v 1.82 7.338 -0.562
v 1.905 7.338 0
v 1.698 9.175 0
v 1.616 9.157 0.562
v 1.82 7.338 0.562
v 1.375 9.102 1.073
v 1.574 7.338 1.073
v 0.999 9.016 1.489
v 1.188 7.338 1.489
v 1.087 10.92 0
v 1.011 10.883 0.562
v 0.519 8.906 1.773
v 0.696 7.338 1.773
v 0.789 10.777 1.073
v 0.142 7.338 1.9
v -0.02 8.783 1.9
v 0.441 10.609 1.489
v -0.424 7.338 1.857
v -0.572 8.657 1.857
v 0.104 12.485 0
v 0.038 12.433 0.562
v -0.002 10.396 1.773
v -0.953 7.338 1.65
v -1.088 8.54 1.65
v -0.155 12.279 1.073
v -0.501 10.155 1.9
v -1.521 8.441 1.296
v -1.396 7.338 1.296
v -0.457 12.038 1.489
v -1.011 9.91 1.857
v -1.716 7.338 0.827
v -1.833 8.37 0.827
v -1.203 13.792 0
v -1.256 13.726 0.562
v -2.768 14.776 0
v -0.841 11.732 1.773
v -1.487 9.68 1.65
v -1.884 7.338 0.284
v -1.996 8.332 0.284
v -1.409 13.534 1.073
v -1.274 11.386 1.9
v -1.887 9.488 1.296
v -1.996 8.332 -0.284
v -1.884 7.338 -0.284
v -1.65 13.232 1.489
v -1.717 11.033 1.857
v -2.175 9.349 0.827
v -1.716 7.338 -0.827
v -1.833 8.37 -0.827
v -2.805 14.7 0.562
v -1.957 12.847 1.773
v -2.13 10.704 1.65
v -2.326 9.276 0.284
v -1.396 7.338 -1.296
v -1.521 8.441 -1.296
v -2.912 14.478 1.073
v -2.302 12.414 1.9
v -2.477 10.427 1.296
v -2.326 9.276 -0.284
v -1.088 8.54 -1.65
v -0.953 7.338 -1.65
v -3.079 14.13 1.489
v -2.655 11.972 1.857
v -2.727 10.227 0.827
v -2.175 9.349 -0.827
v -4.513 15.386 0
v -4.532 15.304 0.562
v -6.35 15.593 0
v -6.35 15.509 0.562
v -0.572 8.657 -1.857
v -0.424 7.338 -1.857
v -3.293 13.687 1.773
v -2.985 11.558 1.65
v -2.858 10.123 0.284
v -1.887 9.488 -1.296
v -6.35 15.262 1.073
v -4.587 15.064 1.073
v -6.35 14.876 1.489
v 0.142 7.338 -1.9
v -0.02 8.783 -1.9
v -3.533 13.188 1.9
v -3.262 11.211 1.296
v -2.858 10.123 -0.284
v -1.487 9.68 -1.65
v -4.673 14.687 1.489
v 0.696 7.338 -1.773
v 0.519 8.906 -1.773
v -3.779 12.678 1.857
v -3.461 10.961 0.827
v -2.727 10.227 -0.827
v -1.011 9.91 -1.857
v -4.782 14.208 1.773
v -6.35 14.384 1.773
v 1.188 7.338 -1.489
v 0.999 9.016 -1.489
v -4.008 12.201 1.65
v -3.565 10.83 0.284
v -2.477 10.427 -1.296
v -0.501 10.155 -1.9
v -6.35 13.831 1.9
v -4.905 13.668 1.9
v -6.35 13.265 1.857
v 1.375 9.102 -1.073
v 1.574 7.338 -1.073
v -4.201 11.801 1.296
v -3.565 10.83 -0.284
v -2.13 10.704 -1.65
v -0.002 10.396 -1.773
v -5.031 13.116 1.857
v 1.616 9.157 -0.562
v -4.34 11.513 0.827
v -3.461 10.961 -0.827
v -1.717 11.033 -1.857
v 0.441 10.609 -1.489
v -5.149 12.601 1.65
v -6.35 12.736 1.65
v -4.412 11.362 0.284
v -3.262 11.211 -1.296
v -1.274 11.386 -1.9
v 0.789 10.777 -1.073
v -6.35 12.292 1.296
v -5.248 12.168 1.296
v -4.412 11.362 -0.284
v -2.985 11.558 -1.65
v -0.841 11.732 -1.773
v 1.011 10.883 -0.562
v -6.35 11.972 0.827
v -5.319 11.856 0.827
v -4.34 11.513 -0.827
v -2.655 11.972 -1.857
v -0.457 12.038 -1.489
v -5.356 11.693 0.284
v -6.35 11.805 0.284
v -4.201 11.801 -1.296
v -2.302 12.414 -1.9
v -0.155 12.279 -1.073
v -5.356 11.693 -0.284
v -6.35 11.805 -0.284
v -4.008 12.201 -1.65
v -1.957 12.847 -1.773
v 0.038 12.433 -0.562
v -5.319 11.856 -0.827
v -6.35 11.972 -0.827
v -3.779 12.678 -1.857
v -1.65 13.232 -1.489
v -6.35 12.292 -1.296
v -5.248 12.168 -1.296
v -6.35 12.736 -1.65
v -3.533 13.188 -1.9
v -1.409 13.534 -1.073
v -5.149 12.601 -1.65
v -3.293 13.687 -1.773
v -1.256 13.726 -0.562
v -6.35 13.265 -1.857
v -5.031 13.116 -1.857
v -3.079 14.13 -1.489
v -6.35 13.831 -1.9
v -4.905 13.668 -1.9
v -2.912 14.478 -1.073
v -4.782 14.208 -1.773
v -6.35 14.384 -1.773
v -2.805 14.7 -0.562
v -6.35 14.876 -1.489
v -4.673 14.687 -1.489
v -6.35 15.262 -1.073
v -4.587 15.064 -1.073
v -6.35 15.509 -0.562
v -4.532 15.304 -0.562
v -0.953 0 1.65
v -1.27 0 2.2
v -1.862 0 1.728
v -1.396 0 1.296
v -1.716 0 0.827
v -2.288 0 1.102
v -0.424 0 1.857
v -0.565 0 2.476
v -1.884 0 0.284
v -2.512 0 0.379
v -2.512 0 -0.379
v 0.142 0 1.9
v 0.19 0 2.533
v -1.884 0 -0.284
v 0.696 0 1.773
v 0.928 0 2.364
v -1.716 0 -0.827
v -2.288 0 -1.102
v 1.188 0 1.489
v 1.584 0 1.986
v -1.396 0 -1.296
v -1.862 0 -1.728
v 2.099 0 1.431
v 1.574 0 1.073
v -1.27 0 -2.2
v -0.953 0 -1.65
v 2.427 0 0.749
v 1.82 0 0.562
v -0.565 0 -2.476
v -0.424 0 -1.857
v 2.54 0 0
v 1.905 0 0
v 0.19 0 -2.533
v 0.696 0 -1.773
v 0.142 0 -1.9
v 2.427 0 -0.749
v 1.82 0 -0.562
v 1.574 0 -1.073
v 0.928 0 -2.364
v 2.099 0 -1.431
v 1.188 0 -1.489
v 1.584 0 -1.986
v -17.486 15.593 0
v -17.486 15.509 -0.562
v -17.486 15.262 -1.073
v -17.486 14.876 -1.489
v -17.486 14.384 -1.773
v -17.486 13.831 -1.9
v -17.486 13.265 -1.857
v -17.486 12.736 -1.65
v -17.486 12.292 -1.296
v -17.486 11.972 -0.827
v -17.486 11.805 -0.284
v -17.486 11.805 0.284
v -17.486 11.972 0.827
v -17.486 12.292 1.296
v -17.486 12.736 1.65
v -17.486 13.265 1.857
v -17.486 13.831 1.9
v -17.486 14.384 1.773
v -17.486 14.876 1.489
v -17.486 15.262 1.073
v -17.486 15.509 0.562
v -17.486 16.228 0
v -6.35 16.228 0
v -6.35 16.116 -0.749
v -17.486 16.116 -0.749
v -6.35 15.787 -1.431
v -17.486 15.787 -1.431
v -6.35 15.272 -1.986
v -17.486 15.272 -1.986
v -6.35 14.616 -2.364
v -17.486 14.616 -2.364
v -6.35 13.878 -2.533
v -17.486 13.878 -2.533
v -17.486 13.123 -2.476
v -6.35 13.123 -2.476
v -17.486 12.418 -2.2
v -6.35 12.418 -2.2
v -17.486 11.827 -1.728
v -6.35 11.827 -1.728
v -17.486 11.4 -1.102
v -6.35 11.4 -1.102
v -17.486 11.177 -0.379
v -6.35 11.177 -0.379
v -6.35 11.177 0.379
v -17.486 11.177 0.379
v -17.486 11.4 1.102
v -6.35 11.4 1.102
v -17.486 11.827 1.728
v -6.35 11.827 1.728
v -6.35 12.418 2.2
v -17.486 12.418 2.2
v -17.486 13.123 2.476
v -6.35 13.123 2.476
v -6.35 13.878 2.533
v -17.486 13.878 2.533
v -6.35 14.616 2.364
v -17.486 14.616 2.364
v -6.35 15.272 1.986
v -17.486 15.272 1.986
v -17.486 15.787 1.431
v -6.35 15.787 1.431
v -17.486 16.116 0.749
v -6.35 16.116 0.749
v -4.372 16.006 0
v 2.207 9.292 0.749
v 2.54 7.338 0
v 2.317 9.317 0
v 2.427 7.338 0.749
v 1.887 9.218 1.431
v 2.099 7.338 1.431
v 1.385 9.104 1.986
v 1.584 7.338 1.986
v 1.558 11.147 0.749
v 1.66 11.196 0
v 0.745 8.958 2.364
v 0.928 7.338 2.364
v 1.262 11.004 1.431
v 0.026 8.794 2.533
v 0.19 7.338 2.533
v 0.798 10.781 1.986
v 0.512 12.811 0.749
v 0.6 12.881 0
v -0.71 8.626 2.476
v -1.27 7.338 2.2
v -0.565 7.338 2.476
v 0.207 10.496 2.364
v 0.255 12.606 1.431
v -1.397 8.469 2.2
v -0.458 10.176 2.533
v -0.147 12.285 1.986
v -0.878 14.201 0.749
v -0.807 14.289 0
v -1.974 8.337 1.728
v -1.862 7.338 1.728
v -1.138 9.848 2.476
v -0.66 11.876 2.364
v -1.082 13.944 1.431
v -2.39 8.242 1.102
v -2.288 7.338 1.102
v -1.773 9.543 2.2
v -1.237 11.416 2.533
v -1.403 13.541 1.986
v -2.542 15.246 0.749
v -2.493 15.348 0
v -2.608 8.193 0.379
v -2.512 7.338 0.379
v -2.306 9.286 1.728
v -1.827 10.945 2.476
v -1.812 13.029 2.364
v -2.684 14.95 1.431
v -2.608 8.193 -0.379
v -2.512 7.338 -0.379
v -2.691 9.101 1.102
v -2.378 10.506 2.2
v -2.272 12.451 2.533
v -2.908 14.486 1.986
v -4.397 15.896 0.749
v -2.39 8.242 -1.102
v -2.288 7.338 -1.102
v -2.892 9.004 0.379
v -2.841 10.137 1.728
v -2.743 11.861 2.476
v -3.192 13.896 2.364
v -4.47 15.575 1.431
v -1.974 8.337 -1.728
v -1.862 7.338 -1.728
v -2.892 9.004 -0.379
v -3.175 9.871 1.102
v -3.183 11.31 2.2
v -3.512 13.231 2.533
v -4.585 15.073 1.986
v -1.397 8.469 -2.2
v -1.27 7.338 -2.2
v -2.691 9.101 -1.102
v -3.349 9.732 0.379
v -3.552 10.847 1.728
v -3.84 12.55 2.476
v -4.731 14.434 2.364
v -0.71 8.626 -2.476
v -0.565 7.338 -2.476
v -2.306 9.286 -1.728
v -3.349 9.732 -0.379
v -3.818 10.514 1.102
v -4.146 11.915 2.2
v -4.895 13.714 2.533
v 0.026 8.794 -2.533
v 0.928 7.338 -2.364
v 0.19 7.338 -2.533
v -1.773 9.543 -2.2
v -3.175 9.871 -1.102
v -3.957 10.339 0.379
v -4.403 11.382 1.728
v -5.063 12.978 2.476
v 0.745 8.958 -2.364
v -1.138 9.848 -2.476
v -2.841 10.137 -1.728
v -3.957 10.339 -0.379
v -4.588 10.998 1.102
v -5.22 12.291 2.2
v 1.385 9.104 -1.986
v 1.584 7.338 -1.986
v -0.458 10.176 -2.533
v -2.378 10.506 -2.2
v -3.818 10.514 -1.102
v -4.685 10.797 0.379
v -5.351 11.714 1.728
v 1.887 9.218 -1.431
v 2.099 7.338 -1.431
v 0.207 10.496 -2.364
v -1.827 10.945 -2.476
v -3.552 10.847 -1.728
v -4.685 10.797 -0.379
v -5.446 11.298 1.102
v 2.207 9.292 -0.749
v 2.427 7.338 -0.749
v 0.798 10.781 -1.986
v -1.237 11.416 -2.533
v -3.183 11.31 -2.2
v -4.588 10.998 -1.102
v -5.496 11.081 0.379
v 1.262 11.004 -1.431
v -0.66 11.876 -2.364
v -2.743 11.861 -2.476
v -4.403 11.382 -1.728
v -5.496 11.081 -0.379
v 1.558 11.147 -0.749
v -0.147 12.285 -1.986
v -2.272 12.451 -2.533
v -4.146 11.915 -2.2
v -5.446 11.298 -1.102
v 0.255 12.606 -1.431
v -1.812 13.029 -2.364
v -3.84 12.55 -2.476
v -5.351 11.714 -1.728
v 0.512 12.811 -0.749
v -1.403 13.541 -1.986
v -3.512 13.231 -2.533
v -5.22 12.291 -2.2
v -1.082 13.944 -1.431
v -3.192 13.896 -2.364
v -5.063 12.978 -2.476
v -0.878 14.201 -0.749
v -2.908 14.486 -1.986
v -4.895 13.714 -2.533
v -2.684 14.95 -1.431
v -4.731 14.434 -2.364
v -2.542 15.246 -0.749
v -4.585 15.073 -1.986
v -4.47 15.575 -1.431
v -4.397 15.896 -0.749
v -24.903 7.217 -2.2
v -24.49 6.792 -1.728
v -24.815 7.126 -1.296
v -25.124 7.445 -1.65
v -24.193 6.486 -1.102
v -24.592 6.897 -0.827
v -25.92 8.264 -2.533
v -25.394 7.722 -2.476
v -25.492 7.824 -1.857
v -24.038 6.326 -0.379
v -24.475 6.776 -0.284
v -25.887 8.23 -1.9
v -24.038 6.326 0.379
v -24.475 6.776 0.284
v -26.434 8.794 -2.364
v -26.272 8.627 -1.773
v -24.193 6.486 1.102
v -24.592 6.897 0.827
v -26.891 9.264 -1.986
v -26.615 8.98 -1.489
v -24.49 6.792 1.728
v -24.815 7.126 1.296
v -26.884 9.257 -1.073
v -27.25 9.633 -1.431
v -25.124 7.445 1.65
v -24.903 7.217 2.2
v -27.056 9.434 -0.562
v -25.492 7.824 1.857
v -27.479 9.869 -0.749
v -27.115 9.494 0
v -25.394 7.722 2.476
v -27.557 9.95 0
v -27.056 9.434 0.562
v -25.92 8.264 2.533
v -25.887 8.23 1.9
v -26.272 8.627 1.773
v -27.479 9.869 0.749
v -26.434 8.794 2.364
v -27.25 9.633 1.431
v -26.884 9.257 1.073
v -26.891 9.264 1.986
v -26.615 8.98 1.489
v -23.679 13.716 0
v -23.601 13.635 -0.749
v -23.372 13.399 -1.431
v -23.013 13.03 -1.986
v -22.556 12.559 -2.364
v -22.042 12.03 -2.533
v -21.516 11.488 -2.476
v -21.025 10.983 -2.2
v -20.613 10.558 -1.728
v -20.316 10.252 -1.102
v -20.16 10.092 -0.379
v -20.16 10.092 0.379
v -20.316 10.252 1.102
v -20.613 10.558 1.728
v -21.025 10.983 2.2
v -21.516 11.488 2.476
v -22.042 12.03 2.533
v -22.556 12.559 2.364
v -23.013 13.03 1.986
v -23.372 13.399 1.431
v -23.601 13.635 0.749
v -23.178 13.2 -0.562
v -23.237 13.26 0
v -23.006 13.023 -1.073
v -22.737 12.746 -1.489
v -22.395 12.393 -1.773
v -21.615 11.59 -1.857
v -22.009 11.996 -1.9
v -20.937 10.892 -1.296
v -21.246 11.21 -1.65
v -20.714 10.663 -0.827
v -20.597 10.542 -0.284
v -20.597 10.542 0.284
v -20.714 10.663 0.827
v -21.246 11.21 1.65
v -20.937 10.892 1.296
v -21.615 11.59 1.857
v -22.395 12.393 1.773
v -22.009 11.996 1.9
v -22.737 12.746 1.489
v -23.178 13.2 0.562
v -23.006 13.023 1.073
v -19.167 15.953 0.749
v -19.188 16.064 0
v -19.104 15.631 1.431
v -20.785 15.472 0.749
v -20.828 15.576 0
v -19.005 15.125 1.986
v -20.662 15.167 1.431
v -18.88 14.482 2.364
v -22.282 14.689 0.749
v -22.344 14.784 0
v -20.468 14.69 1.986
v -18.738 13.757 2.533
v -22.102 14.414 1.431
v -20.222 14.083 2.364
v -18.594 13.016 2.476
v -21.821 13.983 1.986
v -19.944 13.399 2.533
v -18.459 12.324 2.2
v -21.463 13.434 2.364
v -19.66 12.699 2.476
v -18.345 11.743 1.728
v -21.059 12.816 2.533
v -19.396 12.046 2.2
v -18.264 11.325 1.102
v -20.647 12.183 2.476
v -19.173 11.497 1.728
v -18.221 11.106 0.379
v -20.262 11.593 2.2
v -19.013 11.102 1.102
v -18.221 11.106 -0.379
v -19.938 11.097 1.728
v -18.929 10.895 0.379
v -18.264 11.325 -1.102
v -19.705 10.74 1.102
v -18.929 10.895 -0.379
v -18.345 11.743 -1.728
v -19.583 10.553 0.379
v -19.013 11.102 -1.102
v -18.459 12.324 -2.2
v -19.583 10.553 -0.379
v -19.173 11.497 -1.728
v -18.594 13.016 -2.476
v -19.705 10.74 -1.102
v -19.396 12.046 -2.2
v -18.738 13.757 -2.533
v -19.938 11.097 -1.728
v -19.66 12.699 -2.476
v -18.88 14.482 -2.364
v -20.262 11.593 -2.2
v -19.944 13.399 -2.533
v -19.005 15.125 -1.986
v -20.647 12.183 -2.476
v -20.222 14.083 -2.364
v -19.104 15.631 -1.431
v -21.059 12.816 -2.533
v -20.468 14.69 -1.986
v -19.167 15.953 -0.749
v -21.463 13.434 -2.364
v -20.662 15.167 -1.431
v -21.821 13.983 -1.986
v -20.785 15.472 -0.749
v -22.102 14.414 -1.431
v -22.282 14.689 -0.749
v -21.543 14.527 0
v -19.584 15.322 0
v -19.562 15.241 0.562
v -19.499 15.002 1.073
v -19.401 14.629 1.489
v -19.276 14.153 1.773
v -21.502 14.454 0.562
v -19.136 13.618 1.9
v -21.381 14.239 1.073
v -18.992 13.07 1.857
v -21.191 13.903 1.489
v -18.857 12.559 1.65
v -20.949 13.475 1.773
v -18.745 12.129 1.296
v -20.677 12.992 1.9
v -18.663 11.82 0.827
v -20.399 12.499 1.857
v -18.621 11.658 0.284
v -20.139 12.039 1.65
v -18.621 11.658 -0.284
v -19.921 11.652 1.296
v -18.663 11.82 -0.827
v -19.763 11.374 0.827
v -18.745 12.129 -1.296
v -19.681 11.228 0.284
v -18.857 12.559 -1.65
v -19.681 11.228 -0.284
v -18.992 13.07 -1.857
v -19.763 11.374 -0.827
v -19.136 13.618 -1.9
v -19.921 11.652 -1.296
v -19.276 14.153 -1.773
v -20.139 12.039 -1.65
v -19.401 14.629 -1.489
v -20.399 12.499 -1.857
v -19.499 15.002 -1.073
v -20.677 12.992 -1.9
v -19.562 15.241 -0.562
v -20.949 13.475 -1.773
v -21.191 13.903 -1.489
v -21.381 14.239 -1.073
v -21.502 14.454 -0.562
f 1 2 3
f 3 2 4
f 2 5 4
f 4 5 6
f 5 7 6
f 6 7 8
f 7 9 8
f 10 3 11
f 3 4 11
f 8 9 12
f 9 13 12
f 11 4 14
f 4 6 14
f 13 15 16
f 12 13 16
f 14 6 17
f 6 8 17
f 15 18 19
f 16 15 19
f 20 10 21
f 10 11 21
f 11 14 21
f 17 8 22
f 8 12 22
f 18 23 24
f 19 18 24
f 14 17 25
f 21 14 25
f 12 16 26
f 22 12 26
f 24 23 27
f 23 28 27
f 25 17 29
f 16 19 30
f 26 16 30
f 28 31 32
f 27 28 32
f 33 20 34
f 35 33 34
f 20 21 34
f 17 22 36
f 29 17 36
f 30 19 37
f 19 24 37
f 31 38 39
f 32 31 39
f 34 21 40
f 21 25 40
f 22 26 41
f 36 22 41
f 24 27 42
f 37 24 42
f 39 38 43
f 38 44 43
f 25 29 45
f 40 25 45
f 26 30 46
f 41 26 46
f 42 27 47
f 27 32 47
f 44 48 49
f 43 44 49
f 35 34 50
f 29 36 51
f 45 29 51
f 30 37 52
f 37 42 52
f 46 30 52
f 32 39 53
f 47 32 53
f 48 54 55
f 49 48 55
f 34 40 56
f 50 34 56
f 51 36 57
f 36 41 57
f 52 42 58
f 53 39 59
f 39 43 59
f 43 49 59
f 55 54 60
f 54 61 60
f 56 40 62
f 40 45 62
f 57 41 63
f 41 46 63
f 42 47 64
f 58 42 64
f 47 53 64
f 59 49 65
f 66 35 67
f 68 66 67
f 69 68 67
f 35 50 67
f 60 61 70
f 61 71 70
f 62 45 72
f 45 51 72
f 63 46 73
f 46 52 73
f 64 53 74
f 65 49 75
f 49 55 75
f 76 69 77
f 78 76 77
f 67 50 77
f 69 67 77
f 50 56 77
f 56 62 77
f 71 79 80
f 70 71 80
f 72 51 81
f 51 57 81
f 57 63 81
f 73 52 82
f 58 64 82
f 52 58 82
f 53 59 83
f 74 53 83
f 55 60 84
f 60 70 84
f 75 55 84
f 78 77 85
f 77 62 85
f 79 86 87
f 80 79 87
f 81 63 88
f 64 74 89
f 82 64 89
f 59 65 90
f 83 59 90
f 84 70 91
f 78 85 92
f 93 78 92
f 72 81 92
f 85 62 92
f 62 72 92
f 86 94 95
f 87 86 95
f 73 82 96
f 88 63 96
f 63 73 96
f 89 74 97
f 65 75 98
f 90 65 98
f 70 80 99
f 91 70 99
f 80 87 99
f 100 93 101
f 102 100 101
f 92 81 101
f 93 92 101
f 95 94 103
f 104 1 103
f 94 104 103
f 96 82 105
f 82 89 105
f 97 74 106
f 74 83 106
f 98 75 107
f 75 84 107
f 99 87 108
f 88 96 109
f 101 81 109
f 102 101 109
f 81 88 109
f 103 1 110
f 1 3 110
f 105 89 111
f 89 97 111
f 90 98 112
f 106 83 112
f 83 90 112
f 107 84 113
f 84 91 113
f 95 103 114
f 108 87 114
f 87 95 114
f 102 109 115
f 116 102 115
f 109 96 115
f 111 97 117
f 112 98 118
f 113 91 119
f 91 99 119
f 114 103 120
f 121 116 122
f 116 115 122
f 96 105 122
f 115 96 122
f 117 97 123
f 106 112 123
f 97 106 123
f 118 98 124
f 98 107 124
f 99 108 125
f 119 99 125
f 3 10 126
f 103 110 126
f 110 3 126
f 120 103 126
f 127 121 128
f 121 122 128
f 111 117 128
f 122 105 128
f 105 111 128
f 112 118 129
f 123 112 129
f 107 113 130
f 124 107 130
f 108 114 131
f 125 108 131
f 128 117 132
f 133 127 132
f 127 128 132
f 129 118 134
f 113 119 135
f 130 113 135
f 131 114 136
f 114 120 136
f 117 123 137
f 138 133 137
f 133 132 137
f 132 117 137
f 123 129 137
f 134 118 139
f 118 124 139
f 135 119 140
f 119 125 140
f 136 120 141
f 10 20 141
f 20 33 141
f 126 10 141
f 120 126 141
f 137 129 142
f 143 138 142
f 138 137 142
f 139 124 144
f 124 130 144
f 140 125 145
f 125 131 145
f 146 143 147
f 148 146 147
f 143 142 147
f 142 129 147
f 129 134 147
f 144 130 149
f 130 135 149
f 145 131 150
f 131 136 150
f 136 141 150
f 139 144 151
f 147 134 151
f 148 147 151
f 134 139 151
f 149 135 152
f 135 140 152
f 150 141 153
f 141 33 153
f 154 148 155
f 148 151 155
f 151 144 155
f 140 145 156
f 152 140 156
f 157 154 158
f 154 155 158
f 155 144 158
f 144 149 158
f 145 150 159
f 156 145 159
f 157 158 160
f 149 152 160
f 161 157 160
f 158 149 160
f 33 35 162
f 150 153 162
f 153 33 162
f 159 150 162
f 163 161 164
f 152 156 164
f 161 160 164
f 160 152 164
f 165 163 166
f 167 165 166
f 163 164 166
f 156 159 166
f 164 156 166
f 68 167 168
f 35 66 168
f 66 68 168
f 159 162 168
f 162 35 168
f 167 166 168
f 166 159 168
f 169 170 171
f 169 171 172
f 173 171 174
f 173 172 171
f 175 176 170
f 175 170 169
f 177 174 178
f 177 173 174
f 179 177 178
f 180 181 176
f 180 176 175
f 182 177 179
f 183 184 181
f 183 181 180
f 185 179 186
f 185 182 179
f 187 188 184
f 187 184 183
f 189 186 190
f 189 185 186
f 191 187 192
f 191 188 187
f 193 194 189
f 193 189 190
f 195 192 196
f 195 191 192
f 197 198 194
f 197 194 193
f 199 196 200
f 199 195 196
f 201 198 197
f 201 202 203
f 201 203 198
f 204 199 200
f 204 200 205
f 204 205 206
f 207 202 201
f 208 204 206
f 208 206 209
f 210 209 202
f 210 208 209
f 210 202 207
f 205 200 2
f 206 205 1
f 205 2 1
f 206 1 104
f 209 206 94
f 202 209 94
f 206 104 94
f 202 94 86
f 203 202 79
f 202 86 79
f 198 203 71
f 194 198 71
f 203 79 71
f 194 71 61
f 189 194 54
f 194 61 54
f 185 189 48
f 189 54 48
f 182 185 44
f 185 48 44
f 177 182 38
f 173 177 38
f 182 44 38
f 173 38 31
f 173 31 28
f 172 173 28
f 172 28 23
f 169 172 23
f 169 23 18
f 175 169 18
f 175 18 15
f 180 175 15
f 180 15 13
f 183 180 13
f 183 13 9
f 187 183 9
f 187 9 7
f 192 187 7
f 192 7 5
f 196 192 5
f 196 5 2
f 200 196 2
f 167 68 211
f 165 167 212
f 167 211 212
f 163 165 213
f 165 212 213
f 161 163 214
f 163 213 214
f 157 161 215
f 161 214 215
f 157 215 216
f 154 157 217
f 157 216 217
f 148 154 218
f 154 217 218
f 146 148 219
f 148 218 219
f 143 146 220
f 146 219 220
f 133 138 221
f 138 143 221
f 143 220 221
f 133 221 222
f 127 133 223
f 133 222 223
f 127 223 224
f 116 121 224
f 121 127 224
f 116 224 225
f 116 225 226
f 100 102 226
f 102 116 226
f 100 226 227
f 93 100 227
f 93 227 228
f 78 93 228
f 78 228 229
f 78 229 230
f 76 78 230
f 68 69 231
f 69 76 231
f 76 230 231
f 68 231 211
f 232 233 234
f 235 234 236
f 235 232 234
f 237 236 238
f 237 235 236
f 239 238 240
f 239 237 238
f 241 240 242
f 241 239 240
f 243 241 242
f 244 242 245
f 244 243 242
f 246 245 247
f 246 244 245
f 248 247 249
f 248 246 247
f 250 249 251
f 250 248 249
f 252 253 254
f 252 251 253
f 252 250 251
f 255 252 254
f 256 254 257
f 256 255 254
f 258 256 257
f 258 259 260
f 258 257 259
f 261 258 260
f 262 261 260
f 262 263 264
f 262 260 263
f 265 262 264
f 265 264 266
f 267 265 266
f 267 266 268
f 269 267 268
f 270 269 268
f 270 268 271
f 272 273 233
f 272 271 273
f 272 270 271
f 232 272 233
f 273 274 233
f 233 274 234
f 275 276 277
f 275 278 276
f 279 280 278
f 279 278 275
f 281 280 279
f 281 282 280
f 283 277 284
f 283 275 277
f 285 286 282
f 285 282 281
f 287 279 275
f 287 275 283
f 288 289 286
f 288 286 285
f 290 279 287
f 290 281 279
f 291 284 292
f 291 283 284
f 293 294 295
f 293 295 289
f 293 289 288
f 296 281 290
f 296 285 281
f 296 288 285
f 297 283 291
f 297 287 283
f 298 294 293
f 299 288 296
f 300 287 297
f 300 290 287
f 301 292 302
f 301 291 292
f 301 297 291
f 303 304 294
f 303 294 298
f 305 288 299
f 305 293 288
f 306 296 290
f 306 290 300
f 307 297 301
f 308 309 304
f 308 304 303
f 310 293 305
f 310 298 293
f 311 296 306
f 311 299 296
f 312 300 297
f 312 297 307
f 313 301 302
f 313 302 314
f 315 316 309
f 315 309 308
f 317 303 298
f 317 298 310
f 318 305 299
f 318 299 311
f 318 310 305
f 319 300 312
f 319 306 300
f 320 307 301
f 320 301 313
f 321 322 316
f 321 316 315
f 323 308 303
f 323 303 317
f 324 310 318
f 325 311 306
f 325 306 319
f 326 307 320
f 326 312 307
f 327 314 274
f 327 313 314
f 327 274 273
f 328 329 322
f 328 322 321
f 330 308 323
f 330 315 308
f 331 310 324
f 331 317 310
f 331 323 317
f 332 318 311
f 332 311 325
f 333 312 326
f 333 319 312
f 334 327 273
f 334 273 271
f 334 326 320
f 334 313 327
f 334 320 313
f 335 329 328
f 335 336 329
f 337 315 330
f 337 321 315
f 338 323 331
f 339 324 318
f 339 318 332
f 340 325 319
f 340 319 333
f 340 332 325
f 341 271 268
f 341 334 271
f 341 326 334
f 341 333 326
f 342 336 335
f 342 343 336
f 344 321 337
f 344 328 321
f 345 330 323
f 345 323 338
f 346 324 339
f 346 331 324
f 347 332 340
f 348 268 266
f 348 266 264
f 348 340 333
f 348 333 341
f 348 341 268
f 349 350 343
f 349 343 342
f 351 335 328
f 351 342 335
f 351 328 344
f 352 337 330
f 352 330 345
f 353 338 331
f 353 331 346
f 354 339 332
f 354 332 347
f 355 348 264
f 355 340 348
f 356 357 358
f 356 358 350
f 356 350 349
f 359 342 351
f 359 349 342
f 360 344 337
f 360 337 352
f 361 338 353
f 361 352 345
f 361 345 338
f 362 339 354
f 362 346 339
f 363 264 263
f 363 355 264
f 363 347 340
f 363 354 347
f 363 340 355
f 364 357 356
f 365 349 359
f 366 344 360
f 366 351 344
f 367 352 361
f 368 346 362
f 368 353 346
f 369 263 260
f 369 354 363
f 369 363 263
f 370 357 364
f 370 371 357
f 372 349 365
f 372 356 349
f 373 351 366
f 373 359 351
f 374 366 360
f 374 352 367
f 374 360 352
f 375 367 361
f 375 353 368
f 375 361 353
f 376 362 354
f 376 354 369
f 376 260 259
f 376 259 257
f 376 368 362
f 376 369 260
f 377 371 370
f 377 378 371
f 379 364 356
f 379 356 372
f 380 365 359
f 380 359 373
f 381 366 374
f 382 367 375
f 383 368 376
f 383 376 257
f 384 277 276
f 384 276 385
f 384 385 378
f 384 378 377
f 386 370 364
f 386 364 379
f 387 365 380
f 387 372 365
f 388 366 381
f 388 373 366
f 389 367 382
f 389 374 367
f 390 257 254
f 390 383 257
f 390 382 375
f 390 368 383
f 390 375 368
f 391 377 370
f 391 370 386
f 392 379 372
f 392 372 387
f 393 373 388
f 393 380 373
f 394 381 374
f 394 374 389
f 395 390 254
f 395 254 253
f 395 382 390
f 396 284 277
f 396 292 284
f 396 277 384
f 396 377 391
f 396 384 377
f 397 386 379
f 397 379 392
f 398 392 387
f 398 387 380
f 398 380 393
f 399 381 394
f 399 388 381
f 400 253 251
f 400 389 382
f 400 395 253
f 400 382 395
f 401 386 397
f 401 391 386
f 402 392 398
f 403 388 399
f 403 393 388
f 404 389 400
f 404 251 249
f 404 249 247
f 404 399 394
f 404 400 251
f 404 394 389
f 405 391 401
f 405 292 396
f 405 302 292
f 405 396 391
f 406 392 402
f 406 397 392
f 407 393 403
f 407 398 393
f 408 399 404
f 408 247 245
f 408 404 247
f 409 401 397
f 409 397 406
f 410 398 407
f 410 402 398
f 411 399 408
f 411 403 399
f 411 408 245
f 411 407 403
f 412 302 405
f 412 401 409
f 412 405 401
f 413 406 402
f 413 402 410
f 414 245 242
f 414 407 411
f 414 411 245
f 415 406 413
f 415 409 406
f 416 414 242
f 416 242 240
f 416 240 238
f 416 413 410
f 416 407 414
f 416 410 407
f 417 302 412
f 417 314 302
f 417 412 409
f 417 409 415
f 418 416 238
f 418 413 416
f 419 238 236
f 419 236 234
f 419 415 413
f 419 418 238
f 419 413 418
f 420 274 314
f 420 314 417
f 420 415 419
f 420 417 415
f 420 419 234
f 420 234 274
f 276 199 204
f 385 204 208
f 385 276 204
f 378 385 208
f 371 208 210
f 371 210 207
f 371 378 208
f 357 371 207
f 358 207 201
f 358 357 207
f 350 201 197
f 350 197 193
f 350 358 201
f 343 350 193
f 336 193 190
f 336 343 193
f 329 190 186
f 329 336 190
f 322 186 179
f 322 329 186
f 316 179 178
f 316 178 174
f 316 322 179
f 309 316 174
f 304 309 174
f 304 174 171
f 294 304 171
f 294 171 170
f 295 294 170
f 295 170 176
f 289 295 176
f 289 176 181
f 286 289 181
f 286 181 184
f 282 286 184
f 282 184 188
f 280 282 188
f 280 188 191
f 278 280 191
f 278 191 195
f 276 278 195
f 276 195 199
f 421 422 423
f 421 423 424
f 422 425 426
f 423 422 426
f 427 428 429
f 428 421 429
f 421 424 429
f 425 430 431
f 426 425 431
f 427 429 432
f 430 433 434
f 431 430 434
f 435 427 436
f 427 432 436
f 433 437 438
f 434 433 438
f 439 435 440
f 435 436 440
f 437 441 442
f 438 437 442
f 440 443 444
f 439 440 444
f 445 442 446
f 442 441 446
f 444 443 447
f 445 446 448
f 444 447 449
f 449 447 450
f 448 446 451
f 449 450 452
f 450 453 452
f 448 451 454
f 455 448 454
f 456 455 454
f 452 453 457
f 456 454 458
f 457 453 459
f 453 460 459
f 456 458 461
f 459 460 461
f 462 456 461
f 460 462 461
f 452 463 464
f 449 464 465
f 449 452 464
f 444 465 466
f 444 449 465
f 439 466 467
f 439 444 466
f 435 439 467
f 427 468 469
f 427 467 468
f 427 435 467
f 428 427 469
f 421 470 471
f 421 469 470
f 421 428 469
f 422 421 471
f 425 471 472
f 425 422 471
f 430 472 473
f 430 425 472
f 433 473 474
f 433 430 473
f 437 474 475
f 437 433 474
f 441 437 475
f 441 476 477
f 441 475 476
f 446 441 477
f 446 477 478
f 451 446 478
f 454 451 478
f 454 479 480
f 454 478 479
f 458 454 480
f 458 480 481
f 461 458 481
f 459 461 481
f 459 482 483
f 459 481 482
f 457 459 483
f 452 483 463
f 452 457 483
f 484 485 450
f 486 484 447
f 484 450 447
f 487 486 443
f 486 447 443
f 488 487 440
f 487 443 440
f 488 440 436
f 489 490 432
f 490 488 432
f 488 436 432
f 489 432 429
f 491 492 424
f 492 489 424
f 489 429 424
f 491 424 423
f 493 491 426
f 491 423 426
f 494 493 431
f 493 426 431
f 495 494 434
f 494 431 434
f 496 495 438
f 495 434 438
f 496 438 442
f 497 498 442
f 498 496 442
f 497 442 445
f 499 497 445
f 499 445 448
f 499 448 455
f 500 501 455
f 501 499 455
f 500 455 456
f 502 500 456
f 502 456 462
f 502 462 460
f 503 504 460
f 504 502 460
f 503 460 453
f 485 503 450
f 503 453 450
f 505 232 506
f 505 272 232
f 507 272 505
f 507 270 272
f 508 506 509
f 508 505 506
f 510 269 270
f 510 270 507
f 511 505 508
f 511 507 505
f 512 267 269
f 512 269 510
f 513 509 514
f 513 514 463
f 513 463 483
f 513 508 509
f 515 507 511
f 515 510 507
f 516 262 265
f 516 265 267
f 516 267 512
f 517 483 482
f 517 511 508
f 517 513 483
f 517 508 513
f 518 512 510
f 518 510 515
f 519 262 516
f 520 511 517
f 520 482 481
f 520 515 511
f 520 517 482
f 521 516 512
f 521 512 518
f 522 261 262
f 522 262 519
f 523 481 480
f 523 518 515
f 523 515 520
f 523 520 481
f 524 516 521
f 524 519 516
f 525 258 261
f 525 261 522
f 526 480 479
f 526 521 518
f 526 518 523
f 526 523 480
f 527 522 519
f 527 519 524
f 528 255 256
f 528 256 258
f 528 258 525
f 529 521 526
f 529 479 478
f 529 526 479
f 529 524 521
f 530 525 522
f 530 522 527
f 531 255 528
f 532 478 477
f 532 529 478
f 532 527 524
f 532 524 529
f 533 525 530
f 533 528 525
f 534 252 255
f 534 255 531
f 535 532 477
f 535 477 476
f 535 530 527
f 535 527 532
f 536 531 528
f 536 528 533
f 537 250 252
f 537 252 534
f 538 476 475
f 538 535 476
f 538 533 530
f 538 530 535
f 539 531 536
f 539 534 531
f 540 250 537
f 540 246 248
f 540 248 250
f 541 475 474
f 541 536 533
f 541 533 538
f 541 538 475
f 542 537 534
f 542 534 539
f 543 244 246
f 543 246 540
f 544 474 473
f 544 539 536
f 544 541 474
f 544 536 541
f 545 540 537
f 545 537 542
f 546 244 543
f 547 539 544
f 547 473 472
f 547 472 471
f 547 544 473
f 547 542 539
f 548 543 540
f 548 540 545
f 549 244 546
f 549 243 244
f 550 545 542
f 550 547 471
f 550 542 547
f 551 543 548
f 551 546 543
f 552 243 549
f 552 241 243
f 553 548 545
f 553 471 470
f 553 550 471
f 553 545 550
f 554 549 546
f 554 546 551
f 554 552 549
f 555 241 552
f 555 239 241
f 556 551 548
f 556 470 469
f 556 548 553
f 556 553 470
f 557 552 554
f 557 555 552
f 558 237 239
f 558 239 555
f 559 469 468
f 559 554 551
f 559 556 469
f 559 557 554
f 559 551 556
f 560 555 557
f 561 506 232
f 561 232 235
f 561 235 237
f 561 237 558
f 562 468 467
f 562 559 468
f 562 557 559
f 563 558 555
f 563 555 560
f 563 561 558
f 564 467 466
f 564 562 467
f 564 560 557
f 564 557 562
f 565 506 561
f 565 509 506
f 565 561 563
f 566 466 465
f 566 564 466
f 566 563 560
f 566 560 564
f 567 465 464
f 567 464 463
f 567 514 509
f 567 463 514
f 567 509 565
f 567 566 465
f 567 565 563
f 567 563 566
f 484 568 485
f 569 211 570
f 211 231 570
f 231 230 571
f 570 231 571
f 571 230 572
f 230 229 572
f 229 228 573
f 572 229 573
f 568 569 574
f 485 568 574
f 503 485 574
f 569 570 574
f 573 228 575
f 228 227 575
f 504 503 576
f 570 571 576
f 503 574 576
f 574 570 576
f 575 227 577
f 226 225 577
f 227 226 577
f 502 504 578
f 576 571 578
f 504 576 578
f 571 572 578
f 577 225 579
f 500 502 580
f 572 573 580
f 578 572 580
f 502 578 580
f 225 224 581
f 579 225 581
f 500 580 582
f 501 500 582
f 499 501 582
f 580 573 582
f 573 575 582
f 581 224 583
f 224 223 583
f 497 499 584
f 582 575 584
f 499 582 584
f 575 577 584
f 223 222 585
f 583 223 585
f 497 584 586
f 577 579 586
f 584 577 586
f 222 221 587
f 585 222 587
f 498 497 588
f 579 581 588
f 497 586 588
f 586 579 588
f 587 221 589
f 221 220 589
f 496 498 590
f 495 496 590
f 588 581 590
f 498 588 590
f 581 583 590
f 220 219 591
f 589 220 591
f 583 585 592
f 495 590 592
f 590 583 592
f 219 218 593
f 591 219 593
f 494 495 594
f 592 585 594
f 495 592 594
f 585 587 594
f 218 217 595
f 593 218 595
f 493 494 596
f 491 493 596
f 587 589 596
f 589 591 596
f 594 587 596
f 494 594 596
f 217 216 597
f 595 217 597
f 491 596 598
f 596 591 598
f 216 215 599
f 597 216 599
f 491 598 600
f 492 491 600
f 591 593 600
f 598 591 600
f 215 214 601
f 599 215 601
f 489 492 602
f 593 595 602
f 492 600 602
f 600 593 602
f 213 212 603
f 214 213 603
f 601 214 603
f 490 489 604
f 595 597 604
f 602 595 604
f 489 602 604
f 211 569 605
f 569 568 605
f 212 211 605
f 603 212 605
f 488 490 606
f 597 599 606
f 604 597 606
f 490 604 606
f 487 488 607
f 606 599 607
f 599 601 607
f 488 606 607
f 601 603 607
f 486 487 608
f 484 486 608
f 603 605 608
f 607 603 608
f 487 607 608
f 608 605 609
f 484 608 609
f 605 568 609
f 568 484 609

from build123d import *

# Parameters (mm, degrees)
F0_R   = 2.54
F0_R_2 = 1.905


with BuildPart() as f2:
    # F2: sweep along a path in F1
    with BuildLine(Plane.XY) as f2_path:
        Line((0, 0), (0, 7.3384581298))
        ThreePointArc((0, 7.3384581298), (-1.8598719395, 11.8285861903), (-6.35, 13.6884581298))
        Line((-6.35, 13.6884581298), (-12.5316856429, 13.6884581298))
        Line((-12.5316856429, 13.6884581298), (-17.4858820379, 13.6884581298))
        ThreePointArc((-17.4858820379, 13.6884581298), (-19.8729520403, 13.2227080228), (-21.9098557091, 11.8937799577))
        Line((-21.9098557091, 11.8937799577), (-25.7876180112, 8.12782906))
    # F0 (on Front) → F2 (sweep)
    with BuildSketch(Plane.XZ):
        Circle(F0_R)
        Circle(F0_R_2, mode=Mode.SUBTRACT)
    sweep(path=f2_path.line)


solid = f2.part
